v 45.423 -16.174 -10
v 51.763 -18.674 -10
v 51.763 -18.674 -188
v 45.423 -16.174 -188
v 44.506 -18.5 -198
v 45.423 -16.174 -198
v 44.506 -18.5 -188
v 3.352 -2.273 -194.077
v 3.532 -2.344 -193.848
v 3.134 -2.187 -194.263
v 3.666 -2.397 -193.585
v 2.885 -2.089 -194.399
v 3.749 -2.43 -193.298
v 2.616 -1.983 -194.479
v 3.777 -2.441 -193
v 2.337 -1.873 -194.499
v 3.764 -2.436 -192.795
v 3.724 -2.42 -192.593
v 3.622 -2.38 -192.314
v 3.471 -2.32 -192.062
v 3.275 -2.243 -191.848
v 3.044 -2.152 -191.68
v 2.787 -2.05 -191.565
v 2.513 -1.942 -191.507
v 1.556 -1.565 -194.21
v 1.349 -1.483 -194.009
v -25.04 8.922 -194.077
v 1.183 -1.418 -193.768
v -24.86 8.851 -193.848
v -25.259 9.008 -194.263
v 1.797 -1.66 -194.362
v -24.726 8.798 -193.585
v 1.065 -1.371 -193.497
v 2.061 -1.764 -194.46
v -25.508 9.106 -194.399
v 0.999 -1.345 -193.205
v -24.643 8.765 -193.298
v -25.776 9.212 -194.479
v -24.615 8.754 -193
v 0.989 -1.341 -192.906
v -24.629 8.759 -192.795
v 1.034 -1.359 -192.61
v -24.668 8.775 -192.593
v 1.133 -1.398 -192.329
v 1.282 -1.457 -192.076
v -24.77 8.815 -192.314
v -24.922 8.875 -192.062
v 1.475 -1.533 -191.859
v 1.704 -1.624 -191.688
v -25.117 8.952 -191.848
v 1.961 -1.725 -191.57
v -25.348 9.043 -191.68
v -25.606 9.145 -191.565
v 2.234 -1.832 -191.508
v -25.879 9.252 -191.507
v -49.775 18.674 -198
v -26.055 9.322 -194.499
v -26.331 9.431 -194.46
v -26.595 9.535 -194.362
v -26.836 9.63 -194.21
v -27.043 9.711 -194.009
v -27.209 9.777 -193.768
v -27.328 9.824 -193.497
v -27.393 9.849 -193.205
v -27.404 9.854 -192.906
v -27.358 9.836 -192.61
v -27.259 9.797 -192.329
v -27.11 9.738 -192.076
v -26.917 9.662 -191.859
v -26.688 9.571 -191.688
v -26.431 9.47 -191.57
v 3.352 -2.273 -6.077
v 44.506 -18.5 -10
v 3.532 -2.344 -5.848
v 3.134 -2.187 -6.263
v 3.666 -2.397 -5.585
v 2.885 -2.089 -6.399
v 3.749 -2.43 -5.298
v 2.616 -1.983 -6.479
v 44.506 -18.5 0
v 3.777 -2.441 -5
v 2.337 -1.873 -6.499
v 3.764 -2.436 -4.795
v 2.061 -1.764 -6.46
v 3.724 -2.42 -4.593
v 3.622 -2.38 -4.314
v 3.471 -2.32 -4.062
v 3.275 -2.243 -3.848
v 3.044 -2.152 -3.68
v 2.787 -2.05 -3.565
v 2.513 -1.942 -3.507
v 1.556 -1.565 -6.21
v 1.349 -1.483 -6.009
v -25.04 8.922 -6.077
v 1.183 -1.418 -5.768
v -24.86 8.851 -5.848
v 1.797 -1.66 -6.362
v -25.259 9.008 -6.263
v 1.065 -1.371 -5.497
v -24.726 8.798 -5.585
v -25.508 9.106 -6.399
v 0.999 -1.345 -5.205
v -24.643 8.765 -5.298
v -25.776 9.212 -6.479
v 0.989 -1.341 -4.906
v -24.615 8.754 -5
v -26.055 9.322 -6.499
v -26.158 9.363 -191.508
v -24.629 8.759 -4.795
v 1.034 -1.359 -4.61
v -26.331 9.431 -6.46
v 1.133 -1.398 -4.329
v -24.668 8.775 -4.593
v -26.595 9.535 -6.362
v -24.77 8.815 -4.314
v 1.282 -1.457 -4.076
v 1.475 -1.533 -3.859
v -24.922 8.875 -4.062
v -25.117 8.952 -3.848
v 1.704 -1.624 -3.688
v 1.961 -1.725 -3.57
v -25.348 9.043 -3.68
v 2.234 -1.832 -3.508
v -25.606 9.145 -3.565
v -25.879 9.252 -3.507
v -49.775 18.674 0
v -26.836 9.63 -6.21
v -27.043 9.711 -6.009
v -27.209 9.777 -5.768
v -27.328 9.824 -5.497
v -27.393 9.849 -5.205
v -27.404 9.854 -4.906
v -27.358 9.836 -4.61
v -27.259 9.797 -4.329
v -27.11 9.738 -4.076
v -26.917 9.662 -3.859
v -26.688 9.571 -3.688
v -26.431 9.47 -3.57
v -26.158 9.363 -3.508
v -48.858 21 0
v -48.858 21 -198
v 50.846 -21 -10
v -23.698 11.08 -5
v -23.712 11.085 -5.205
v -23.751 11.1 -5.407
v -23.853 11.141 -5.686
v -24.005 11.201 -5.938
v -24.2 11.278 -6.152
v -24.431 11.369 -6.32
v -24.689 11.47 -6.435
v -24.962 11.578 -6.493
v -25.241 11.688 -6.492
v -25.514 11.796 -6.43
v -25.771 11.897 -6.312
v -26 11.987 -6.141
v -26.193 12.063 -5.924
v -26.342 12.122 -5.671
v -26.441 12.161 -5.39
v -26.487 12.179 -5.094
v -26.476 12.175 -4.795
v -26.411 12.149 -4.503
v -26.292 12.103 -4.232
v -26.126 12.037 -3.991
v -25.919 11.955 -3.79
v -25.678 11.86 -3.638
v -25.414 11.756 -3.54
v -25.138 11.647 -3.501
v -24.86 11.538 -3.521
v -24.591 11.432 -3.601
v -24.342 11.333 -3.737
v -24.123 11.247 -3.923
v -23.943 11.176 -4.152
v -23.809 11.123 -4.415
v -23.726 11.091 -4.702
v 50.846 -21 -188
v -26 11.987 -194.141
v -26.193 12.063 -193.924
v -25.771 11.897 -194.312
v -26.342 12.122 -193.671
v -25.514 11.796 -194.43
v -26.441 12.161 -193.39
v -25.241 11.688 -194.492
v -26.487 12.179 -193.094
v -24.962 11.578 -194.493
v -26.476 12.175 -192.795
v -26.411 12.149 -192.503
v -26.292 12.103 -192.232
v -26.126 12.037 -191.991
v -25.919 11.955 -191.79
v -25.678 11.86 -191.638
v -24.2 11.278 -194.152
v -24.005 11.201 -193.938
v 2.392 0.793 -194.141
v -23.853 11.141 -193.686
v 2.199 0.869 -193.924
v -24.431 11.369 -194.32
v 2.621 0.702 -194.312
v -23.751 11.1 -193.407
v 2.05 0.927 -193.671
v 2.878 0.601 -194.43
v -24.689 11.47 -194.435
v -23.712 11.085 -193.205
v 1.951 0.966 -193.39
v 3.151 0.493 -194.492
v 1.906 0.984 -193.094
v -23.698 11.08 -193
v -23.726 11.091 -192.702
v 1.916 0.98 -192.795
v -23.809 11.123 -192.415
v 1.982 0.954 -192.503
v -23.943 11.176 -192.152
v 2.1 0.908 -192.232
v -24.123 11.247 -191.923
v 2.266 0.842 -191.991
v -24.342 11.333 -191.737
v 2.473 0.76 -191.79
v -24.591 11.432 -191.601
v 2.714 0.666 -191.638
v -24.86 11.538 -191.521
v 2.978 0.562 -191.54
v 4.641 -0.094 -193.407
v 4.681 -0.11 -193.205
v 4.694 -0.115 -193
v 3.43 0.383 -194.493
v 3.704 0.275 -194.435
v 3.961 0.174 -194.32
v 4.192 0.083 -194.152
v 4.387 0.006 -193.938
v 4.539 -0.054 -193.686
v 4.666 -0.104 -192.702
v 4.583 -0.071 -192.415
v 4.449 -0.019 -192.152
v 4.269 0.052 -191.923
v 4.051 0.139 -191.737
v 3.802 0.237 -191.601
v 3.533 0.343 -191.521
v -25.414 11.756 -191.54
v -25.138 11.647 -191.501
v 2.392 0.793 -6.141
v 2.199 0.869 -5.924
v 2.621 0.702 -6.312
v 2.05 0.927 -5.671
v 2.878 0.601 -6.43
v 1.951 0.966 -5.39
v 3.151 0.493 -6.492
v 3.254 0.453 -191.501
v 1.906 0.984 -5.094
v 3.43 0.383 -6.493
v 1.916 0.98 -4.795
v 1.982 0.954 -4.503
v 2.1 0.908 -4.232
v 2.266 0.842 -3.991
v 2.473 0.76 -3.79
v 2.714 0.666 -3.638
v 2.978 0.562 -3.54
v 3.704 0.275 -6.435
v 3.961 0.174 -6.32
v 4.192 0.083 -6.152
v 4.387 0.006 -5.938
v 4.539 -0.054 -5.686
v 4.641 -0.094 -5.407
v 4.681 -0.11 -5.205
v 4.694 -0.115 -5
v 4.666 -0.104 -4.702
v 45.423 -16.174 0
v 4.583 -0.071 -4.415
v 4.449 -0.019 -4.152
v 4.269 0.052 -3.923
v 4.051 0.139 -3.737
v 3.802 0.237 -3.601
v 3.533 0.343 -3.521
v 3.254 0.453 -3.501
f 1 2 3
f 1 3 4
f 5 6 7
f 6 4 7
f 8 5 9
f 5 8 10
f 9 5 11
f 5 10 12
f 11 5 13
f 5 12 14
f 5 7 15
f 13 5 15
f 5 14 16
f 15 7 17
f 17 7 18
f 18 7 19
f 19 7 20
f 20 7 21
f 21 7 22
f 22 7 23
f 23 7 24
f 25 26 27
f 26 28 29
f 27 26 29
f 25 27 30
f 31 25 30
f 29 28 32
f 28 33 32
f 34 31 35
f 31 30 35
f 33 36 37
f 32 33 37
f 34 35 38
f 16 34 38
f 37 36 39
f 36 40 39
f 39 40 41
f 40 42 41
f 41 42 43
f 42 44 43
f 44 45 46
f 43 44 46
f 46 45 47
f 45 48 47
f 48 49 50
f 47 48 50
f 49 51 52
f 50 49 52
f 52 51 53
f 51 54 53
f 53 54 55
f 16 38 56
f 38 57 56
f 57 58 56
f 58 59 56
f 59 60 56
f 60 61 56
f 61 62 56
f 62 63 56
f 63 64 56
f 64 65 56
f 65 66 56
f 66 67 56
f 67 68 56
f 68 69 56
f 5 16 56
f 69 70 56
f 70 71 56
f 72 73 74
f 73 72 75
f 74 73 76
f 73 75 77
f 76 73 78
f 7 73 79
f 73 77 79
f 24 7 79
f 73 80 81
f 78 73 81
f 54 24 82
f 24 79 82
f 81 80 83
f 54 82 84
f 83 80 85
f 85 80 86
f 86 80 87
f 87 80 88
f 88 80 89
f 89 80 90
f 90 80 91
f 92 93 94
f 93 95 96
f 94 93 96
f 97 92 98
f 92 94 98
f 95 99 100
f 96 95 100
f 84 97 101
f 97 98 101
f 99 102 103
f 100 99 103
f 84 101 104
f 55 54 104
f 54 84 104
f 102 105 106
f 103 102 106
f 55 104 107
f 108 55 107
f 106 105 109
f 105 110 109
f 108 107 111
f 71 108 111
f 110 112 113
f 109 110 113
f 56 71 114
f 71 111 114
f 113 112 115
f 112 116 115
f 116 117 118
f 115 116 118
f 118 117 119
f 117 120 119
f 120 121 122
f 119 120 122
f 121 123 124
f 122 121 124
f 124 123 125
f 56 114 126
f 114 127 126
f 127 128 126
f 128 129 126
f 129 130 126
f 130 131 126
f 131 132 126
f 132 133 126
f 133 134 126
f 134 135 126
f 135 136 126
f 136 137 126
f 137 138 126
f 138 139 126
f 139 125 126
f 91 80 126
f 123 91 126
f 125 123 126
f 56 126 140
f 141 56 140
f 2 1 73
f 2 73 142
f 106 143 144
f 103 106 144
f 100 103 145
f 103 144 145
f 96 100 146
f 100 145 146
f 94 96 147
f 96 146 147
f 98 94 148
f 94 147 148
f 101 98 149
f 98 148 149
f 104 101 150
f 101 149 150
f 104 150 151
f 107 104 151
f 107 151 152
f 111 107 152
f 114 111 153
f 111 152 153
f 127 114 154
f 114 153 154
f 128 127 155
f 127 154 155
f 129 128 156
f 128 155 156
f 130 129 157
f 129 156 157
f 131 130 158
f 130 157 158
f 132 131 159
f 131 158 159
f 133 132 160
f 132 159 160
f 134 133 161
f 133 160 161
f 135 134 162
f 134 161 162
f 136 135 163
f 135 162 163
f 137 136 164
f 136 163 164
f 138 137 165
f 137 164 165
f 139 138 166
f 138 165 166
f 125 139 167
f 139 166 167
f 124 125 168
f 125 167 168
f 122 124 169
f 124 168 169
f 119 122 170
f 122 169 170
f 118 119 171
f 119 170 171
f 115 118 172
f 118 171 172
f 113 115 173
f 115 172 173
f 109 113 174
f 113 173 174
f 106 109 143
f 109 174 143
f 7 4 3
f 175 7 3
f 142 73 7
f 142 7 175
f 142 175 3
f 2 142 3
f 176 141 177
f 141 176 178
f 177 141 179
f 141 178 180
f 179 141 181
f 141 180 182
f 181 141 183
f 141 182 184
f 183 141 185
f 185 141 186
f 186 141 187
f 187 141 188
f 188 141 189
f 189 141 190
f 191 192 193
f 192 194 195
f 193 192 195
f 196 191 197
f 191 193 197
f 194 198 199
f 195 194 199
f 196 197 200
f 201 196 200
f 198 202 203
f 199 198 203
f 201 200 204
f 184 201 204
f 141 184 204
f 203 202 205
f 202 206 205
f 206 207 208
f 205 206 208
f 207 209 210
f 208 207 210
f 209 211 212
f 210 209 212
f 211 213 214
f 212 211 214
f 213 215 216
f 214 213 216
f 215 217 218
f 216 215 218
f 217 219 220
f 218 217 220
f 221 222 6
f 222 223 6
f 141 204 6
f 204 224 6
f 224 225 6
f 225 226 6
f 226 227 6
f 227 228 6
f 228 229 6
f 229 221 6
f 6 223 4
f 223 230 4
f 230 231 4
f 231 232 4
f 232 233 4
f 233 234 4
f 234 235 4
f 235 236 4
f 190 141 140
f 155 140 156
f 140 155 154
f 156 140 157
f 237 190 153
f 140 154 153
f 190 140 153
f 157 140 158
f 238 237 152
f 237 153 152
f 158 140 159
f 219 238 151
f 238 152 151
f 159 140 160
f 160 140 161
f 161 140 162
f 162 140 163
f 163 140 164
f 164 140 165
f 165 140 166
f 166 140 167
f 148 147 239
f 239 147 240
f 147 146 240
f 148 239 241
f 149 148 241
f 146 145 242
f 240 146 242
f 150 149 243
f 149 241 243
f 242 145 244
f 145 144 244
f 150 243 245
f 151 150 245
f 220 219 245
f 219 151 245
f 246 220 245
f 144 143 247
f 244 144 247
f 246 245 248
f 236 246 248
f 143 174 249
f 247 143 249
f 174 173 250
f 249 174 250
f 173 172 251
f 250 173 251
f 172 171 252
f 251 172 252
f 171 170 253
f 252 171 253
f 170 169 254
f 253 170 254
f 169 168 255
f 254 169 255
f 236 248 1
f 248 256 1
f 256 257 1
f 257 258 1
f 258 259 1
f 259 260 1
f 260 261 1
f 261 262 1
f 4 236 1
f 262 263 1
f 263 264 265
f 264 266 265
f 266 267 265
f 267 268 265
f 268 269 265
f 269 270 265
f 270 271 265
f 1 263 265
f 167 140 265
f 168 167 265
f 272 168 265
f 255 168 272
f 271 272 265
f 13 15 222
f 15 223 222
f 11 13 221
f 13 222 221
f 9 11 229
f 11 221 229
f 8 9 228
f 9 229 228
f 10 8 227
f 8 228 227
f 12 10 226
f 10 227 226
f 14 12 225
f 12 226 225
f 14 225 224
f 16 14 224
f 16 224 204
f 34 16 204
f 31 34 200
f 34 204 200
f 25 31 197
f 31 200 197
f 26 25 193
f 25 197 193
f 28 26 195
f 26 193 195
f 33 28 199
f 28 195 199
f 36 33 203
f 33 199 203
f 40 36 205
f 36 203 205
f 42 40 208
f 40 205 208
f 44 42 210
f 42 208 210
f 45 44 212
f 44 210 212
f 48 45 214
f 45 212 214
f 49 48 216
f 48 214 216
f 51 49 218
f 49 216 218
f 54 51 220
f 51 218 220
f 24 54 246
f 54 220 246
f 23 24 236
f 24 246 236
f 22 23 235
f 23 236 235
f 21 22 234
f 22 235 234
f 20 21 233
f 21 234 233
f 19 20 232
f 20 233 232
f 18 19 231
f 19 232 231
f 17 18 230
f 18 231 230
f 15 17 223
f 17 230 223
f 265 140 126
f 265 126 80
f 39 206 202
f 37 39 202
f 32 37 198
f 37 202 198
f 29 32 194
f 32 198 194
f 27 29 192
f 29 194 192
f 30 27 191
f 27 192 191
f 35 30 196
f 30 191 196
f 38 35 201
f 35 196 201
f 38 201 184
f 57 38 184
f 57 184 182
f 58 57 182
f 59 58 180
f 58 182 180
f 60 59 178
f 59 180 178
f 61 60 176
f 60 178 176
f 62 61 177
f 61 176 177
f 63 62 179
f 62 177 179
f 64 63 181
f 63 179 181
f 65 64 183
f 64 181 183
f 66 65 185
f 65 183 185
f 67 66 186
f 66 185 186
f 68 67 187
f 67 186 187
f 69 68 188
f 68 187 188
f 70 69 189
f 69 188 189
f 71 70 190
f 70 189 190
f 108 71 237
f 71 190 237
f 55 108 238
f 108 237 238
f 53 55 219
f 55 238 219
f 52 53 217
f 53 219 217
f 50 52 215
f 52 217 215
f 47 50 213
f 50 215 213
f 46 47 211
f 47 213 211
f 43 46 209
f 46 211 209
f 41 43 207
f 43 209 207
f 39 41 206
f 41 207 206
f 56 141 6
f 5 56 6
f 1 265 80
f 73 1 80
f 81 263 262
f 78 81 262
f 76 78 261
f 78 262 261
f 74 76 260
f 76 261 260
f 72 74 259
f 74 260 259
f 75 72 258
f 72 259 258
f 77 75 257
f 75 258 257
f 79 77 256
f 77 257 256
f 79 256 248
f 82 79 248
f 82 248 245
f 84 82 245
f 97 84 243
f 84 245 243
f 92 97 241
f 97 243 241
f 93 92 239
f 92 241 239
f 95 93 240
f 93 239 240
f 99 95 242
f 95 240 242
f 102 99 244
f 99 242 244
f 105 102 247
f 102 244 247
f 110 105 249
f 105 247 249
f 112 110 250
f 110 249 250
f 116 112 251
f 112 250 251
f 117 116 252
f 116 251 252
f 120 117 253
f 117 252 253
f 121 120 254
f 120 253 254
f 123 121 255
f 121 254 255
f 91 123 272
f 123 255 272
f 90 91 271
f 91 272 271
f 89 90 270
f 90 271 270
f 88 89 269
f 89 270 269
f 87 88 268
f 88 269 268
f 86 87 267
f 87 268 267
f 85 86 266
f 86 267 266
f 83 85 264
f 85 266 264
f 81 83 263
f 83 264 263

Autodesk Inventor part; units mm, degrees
ref_plane "YZ Plane" through (0, 0, 0) normal (1, 0, 0) x (0, 1, 0)
ref_plane "XZ Plane" through (0, 0, 0) normal (0, 1, 0) x (-1, 0, 0)
ref_plane "XY Plane" through (0, 0, 0) normal (0, 0, 1) x (1, 0, 0)
sketch "スケッチ1" plane through (0, 0, 0) normal (0, 0, 1) x (1, 0, 0)
  line L0 (-53.8577, -21) -> (53.8577, -21) projected
  line L1 (53.8577, -21) -> (53.8577, -19.5) projected
  line L2 (53.8577, -19.5) -> (45.423, -16.1743) projected
  line L3 (45.423, -16.1743) -> (44.506, -18.5) projected
  line L4 (44.506, -18.5) -> (-49.7747, 18.6743) projected
  line L5 (-49.7747, 18.6743) -> (-48.8577, 21) projected
  line L6 (-48.8577, 21) -> (-53.8577, 21) projected
  line L7 (-53.8577, 21) -> (-53.8577, -21) projected
  line L8 (-42.0411, 10.2503) -> (14.7433, -12.1394) projected
  arc A0 (14.0097, -16) -> (14.7433, -12.1394) centre (14.0097, -14) ccw projected
  line L9 (14.0097, -16) -> (-42.7747, -16) projected
  arc A1 (-44.7747, -14) -> (-42.7747, -16) centre (-42.7747, -14) ccw projected
  line L10 (-44.7747, -14) -> (-44.7747, 8.3897) projected
  arc A2 (-42.0411, 10.2503) -> (-44.7747, 8.3897) centre (-42.7747, 8.3897) ccw projected
  line L11 (-48.8577, 21) -> (45.423, -16.1743)
  point P0 (0, 0)
extrude "押し出し1" add sketch "スケッチ1" against normal blind 198 contours L11 L3 L4 L5
ref_plane "作業平面1" through (0, 0, -10) normal (0, 0, 1) x (1, 0, 0)
sketch "スケッチ2" plane through (0, 0, 0) normal (0, 0, 1) x (1, 0, 0)
  line L0 (-53.8577, -21) -> (53.8577, -21) projected
  line L1 (53.8577, -21) -> (53.8577, -19.5) projected
  line L2 (53.8577, -19.5) -> (45.423, -16.1743) projected
  line L3 (45.423, -16.1743) -> (44.506, -18.5) projected
  line L4 (44.506, -18.5) -> (-49.7747, 18.6743) projected
  line L5 (-49.7747, 18.6743) -> (-48.8577, 21) projected
  line L6 (-48.8577, 21) -> (-53.8577, 21) projected
  line L7 (-53.8577, 21) -> (-53.8577, -21) projected
  line L8 (-42.0411, 10.2503) -> (14.7433, -12.1394) projected
  arc A0 (14.0097, -16) -> (14.7433, -12.1394) centre (14.0097, -14) ccw projected
  line L9 (14.0097, -16) -> (-42.7747, -16) projected
  arc A1 (-44.7747, -14) -> (-42.7747, -16) centre (-42.7747, -14) ccw projected
  line L10 (-44.7747, -14) -> (-44.7747, 8.3897) projected
  arc A2 (-42.0411, 10.2503) -> (-44.7747, 8.3897) centre (-42.7747, 8.3897) ccw projected
  line L11 (45.423, -16.1743) -> (44.506, -18.5)
  line L12 (44.506, -18.5) -> (50.8464, -21)
  line L13 (50.8464, -21) -> (51.7634, -18.6743)
  line L14 (51.7634, -18.6743) -> (45.423, -16.1743)
  point P0 (0, 0)
extrude "押し出し2" add sketch "スケッチ2" against normal blind 178 from surface at -10 contours L12 L3 L2 L13
sketch "スケッチ3" plane through (-48.8577, 21, 0) normal (0.3668, 0.9303, 0) x (0.9303, -0.3668, 0)
  circle A0 centre (56.0638, 5) radius 1.5 projected
  circle A1 centre (25.5443, 5) radius 1.5 projected
  circle A2 centre (25.5443, 193) radius 1.5 projected
  circle A3 centre (56.0638, 193) radius 1.5 projected
  point P0 (53.1551, 0)
extrude "押し出し3" cut sketch "スケッチ3" against normal blind 2.5
properties part number "Slope_Riner" material "木材 (カエデ材)"
